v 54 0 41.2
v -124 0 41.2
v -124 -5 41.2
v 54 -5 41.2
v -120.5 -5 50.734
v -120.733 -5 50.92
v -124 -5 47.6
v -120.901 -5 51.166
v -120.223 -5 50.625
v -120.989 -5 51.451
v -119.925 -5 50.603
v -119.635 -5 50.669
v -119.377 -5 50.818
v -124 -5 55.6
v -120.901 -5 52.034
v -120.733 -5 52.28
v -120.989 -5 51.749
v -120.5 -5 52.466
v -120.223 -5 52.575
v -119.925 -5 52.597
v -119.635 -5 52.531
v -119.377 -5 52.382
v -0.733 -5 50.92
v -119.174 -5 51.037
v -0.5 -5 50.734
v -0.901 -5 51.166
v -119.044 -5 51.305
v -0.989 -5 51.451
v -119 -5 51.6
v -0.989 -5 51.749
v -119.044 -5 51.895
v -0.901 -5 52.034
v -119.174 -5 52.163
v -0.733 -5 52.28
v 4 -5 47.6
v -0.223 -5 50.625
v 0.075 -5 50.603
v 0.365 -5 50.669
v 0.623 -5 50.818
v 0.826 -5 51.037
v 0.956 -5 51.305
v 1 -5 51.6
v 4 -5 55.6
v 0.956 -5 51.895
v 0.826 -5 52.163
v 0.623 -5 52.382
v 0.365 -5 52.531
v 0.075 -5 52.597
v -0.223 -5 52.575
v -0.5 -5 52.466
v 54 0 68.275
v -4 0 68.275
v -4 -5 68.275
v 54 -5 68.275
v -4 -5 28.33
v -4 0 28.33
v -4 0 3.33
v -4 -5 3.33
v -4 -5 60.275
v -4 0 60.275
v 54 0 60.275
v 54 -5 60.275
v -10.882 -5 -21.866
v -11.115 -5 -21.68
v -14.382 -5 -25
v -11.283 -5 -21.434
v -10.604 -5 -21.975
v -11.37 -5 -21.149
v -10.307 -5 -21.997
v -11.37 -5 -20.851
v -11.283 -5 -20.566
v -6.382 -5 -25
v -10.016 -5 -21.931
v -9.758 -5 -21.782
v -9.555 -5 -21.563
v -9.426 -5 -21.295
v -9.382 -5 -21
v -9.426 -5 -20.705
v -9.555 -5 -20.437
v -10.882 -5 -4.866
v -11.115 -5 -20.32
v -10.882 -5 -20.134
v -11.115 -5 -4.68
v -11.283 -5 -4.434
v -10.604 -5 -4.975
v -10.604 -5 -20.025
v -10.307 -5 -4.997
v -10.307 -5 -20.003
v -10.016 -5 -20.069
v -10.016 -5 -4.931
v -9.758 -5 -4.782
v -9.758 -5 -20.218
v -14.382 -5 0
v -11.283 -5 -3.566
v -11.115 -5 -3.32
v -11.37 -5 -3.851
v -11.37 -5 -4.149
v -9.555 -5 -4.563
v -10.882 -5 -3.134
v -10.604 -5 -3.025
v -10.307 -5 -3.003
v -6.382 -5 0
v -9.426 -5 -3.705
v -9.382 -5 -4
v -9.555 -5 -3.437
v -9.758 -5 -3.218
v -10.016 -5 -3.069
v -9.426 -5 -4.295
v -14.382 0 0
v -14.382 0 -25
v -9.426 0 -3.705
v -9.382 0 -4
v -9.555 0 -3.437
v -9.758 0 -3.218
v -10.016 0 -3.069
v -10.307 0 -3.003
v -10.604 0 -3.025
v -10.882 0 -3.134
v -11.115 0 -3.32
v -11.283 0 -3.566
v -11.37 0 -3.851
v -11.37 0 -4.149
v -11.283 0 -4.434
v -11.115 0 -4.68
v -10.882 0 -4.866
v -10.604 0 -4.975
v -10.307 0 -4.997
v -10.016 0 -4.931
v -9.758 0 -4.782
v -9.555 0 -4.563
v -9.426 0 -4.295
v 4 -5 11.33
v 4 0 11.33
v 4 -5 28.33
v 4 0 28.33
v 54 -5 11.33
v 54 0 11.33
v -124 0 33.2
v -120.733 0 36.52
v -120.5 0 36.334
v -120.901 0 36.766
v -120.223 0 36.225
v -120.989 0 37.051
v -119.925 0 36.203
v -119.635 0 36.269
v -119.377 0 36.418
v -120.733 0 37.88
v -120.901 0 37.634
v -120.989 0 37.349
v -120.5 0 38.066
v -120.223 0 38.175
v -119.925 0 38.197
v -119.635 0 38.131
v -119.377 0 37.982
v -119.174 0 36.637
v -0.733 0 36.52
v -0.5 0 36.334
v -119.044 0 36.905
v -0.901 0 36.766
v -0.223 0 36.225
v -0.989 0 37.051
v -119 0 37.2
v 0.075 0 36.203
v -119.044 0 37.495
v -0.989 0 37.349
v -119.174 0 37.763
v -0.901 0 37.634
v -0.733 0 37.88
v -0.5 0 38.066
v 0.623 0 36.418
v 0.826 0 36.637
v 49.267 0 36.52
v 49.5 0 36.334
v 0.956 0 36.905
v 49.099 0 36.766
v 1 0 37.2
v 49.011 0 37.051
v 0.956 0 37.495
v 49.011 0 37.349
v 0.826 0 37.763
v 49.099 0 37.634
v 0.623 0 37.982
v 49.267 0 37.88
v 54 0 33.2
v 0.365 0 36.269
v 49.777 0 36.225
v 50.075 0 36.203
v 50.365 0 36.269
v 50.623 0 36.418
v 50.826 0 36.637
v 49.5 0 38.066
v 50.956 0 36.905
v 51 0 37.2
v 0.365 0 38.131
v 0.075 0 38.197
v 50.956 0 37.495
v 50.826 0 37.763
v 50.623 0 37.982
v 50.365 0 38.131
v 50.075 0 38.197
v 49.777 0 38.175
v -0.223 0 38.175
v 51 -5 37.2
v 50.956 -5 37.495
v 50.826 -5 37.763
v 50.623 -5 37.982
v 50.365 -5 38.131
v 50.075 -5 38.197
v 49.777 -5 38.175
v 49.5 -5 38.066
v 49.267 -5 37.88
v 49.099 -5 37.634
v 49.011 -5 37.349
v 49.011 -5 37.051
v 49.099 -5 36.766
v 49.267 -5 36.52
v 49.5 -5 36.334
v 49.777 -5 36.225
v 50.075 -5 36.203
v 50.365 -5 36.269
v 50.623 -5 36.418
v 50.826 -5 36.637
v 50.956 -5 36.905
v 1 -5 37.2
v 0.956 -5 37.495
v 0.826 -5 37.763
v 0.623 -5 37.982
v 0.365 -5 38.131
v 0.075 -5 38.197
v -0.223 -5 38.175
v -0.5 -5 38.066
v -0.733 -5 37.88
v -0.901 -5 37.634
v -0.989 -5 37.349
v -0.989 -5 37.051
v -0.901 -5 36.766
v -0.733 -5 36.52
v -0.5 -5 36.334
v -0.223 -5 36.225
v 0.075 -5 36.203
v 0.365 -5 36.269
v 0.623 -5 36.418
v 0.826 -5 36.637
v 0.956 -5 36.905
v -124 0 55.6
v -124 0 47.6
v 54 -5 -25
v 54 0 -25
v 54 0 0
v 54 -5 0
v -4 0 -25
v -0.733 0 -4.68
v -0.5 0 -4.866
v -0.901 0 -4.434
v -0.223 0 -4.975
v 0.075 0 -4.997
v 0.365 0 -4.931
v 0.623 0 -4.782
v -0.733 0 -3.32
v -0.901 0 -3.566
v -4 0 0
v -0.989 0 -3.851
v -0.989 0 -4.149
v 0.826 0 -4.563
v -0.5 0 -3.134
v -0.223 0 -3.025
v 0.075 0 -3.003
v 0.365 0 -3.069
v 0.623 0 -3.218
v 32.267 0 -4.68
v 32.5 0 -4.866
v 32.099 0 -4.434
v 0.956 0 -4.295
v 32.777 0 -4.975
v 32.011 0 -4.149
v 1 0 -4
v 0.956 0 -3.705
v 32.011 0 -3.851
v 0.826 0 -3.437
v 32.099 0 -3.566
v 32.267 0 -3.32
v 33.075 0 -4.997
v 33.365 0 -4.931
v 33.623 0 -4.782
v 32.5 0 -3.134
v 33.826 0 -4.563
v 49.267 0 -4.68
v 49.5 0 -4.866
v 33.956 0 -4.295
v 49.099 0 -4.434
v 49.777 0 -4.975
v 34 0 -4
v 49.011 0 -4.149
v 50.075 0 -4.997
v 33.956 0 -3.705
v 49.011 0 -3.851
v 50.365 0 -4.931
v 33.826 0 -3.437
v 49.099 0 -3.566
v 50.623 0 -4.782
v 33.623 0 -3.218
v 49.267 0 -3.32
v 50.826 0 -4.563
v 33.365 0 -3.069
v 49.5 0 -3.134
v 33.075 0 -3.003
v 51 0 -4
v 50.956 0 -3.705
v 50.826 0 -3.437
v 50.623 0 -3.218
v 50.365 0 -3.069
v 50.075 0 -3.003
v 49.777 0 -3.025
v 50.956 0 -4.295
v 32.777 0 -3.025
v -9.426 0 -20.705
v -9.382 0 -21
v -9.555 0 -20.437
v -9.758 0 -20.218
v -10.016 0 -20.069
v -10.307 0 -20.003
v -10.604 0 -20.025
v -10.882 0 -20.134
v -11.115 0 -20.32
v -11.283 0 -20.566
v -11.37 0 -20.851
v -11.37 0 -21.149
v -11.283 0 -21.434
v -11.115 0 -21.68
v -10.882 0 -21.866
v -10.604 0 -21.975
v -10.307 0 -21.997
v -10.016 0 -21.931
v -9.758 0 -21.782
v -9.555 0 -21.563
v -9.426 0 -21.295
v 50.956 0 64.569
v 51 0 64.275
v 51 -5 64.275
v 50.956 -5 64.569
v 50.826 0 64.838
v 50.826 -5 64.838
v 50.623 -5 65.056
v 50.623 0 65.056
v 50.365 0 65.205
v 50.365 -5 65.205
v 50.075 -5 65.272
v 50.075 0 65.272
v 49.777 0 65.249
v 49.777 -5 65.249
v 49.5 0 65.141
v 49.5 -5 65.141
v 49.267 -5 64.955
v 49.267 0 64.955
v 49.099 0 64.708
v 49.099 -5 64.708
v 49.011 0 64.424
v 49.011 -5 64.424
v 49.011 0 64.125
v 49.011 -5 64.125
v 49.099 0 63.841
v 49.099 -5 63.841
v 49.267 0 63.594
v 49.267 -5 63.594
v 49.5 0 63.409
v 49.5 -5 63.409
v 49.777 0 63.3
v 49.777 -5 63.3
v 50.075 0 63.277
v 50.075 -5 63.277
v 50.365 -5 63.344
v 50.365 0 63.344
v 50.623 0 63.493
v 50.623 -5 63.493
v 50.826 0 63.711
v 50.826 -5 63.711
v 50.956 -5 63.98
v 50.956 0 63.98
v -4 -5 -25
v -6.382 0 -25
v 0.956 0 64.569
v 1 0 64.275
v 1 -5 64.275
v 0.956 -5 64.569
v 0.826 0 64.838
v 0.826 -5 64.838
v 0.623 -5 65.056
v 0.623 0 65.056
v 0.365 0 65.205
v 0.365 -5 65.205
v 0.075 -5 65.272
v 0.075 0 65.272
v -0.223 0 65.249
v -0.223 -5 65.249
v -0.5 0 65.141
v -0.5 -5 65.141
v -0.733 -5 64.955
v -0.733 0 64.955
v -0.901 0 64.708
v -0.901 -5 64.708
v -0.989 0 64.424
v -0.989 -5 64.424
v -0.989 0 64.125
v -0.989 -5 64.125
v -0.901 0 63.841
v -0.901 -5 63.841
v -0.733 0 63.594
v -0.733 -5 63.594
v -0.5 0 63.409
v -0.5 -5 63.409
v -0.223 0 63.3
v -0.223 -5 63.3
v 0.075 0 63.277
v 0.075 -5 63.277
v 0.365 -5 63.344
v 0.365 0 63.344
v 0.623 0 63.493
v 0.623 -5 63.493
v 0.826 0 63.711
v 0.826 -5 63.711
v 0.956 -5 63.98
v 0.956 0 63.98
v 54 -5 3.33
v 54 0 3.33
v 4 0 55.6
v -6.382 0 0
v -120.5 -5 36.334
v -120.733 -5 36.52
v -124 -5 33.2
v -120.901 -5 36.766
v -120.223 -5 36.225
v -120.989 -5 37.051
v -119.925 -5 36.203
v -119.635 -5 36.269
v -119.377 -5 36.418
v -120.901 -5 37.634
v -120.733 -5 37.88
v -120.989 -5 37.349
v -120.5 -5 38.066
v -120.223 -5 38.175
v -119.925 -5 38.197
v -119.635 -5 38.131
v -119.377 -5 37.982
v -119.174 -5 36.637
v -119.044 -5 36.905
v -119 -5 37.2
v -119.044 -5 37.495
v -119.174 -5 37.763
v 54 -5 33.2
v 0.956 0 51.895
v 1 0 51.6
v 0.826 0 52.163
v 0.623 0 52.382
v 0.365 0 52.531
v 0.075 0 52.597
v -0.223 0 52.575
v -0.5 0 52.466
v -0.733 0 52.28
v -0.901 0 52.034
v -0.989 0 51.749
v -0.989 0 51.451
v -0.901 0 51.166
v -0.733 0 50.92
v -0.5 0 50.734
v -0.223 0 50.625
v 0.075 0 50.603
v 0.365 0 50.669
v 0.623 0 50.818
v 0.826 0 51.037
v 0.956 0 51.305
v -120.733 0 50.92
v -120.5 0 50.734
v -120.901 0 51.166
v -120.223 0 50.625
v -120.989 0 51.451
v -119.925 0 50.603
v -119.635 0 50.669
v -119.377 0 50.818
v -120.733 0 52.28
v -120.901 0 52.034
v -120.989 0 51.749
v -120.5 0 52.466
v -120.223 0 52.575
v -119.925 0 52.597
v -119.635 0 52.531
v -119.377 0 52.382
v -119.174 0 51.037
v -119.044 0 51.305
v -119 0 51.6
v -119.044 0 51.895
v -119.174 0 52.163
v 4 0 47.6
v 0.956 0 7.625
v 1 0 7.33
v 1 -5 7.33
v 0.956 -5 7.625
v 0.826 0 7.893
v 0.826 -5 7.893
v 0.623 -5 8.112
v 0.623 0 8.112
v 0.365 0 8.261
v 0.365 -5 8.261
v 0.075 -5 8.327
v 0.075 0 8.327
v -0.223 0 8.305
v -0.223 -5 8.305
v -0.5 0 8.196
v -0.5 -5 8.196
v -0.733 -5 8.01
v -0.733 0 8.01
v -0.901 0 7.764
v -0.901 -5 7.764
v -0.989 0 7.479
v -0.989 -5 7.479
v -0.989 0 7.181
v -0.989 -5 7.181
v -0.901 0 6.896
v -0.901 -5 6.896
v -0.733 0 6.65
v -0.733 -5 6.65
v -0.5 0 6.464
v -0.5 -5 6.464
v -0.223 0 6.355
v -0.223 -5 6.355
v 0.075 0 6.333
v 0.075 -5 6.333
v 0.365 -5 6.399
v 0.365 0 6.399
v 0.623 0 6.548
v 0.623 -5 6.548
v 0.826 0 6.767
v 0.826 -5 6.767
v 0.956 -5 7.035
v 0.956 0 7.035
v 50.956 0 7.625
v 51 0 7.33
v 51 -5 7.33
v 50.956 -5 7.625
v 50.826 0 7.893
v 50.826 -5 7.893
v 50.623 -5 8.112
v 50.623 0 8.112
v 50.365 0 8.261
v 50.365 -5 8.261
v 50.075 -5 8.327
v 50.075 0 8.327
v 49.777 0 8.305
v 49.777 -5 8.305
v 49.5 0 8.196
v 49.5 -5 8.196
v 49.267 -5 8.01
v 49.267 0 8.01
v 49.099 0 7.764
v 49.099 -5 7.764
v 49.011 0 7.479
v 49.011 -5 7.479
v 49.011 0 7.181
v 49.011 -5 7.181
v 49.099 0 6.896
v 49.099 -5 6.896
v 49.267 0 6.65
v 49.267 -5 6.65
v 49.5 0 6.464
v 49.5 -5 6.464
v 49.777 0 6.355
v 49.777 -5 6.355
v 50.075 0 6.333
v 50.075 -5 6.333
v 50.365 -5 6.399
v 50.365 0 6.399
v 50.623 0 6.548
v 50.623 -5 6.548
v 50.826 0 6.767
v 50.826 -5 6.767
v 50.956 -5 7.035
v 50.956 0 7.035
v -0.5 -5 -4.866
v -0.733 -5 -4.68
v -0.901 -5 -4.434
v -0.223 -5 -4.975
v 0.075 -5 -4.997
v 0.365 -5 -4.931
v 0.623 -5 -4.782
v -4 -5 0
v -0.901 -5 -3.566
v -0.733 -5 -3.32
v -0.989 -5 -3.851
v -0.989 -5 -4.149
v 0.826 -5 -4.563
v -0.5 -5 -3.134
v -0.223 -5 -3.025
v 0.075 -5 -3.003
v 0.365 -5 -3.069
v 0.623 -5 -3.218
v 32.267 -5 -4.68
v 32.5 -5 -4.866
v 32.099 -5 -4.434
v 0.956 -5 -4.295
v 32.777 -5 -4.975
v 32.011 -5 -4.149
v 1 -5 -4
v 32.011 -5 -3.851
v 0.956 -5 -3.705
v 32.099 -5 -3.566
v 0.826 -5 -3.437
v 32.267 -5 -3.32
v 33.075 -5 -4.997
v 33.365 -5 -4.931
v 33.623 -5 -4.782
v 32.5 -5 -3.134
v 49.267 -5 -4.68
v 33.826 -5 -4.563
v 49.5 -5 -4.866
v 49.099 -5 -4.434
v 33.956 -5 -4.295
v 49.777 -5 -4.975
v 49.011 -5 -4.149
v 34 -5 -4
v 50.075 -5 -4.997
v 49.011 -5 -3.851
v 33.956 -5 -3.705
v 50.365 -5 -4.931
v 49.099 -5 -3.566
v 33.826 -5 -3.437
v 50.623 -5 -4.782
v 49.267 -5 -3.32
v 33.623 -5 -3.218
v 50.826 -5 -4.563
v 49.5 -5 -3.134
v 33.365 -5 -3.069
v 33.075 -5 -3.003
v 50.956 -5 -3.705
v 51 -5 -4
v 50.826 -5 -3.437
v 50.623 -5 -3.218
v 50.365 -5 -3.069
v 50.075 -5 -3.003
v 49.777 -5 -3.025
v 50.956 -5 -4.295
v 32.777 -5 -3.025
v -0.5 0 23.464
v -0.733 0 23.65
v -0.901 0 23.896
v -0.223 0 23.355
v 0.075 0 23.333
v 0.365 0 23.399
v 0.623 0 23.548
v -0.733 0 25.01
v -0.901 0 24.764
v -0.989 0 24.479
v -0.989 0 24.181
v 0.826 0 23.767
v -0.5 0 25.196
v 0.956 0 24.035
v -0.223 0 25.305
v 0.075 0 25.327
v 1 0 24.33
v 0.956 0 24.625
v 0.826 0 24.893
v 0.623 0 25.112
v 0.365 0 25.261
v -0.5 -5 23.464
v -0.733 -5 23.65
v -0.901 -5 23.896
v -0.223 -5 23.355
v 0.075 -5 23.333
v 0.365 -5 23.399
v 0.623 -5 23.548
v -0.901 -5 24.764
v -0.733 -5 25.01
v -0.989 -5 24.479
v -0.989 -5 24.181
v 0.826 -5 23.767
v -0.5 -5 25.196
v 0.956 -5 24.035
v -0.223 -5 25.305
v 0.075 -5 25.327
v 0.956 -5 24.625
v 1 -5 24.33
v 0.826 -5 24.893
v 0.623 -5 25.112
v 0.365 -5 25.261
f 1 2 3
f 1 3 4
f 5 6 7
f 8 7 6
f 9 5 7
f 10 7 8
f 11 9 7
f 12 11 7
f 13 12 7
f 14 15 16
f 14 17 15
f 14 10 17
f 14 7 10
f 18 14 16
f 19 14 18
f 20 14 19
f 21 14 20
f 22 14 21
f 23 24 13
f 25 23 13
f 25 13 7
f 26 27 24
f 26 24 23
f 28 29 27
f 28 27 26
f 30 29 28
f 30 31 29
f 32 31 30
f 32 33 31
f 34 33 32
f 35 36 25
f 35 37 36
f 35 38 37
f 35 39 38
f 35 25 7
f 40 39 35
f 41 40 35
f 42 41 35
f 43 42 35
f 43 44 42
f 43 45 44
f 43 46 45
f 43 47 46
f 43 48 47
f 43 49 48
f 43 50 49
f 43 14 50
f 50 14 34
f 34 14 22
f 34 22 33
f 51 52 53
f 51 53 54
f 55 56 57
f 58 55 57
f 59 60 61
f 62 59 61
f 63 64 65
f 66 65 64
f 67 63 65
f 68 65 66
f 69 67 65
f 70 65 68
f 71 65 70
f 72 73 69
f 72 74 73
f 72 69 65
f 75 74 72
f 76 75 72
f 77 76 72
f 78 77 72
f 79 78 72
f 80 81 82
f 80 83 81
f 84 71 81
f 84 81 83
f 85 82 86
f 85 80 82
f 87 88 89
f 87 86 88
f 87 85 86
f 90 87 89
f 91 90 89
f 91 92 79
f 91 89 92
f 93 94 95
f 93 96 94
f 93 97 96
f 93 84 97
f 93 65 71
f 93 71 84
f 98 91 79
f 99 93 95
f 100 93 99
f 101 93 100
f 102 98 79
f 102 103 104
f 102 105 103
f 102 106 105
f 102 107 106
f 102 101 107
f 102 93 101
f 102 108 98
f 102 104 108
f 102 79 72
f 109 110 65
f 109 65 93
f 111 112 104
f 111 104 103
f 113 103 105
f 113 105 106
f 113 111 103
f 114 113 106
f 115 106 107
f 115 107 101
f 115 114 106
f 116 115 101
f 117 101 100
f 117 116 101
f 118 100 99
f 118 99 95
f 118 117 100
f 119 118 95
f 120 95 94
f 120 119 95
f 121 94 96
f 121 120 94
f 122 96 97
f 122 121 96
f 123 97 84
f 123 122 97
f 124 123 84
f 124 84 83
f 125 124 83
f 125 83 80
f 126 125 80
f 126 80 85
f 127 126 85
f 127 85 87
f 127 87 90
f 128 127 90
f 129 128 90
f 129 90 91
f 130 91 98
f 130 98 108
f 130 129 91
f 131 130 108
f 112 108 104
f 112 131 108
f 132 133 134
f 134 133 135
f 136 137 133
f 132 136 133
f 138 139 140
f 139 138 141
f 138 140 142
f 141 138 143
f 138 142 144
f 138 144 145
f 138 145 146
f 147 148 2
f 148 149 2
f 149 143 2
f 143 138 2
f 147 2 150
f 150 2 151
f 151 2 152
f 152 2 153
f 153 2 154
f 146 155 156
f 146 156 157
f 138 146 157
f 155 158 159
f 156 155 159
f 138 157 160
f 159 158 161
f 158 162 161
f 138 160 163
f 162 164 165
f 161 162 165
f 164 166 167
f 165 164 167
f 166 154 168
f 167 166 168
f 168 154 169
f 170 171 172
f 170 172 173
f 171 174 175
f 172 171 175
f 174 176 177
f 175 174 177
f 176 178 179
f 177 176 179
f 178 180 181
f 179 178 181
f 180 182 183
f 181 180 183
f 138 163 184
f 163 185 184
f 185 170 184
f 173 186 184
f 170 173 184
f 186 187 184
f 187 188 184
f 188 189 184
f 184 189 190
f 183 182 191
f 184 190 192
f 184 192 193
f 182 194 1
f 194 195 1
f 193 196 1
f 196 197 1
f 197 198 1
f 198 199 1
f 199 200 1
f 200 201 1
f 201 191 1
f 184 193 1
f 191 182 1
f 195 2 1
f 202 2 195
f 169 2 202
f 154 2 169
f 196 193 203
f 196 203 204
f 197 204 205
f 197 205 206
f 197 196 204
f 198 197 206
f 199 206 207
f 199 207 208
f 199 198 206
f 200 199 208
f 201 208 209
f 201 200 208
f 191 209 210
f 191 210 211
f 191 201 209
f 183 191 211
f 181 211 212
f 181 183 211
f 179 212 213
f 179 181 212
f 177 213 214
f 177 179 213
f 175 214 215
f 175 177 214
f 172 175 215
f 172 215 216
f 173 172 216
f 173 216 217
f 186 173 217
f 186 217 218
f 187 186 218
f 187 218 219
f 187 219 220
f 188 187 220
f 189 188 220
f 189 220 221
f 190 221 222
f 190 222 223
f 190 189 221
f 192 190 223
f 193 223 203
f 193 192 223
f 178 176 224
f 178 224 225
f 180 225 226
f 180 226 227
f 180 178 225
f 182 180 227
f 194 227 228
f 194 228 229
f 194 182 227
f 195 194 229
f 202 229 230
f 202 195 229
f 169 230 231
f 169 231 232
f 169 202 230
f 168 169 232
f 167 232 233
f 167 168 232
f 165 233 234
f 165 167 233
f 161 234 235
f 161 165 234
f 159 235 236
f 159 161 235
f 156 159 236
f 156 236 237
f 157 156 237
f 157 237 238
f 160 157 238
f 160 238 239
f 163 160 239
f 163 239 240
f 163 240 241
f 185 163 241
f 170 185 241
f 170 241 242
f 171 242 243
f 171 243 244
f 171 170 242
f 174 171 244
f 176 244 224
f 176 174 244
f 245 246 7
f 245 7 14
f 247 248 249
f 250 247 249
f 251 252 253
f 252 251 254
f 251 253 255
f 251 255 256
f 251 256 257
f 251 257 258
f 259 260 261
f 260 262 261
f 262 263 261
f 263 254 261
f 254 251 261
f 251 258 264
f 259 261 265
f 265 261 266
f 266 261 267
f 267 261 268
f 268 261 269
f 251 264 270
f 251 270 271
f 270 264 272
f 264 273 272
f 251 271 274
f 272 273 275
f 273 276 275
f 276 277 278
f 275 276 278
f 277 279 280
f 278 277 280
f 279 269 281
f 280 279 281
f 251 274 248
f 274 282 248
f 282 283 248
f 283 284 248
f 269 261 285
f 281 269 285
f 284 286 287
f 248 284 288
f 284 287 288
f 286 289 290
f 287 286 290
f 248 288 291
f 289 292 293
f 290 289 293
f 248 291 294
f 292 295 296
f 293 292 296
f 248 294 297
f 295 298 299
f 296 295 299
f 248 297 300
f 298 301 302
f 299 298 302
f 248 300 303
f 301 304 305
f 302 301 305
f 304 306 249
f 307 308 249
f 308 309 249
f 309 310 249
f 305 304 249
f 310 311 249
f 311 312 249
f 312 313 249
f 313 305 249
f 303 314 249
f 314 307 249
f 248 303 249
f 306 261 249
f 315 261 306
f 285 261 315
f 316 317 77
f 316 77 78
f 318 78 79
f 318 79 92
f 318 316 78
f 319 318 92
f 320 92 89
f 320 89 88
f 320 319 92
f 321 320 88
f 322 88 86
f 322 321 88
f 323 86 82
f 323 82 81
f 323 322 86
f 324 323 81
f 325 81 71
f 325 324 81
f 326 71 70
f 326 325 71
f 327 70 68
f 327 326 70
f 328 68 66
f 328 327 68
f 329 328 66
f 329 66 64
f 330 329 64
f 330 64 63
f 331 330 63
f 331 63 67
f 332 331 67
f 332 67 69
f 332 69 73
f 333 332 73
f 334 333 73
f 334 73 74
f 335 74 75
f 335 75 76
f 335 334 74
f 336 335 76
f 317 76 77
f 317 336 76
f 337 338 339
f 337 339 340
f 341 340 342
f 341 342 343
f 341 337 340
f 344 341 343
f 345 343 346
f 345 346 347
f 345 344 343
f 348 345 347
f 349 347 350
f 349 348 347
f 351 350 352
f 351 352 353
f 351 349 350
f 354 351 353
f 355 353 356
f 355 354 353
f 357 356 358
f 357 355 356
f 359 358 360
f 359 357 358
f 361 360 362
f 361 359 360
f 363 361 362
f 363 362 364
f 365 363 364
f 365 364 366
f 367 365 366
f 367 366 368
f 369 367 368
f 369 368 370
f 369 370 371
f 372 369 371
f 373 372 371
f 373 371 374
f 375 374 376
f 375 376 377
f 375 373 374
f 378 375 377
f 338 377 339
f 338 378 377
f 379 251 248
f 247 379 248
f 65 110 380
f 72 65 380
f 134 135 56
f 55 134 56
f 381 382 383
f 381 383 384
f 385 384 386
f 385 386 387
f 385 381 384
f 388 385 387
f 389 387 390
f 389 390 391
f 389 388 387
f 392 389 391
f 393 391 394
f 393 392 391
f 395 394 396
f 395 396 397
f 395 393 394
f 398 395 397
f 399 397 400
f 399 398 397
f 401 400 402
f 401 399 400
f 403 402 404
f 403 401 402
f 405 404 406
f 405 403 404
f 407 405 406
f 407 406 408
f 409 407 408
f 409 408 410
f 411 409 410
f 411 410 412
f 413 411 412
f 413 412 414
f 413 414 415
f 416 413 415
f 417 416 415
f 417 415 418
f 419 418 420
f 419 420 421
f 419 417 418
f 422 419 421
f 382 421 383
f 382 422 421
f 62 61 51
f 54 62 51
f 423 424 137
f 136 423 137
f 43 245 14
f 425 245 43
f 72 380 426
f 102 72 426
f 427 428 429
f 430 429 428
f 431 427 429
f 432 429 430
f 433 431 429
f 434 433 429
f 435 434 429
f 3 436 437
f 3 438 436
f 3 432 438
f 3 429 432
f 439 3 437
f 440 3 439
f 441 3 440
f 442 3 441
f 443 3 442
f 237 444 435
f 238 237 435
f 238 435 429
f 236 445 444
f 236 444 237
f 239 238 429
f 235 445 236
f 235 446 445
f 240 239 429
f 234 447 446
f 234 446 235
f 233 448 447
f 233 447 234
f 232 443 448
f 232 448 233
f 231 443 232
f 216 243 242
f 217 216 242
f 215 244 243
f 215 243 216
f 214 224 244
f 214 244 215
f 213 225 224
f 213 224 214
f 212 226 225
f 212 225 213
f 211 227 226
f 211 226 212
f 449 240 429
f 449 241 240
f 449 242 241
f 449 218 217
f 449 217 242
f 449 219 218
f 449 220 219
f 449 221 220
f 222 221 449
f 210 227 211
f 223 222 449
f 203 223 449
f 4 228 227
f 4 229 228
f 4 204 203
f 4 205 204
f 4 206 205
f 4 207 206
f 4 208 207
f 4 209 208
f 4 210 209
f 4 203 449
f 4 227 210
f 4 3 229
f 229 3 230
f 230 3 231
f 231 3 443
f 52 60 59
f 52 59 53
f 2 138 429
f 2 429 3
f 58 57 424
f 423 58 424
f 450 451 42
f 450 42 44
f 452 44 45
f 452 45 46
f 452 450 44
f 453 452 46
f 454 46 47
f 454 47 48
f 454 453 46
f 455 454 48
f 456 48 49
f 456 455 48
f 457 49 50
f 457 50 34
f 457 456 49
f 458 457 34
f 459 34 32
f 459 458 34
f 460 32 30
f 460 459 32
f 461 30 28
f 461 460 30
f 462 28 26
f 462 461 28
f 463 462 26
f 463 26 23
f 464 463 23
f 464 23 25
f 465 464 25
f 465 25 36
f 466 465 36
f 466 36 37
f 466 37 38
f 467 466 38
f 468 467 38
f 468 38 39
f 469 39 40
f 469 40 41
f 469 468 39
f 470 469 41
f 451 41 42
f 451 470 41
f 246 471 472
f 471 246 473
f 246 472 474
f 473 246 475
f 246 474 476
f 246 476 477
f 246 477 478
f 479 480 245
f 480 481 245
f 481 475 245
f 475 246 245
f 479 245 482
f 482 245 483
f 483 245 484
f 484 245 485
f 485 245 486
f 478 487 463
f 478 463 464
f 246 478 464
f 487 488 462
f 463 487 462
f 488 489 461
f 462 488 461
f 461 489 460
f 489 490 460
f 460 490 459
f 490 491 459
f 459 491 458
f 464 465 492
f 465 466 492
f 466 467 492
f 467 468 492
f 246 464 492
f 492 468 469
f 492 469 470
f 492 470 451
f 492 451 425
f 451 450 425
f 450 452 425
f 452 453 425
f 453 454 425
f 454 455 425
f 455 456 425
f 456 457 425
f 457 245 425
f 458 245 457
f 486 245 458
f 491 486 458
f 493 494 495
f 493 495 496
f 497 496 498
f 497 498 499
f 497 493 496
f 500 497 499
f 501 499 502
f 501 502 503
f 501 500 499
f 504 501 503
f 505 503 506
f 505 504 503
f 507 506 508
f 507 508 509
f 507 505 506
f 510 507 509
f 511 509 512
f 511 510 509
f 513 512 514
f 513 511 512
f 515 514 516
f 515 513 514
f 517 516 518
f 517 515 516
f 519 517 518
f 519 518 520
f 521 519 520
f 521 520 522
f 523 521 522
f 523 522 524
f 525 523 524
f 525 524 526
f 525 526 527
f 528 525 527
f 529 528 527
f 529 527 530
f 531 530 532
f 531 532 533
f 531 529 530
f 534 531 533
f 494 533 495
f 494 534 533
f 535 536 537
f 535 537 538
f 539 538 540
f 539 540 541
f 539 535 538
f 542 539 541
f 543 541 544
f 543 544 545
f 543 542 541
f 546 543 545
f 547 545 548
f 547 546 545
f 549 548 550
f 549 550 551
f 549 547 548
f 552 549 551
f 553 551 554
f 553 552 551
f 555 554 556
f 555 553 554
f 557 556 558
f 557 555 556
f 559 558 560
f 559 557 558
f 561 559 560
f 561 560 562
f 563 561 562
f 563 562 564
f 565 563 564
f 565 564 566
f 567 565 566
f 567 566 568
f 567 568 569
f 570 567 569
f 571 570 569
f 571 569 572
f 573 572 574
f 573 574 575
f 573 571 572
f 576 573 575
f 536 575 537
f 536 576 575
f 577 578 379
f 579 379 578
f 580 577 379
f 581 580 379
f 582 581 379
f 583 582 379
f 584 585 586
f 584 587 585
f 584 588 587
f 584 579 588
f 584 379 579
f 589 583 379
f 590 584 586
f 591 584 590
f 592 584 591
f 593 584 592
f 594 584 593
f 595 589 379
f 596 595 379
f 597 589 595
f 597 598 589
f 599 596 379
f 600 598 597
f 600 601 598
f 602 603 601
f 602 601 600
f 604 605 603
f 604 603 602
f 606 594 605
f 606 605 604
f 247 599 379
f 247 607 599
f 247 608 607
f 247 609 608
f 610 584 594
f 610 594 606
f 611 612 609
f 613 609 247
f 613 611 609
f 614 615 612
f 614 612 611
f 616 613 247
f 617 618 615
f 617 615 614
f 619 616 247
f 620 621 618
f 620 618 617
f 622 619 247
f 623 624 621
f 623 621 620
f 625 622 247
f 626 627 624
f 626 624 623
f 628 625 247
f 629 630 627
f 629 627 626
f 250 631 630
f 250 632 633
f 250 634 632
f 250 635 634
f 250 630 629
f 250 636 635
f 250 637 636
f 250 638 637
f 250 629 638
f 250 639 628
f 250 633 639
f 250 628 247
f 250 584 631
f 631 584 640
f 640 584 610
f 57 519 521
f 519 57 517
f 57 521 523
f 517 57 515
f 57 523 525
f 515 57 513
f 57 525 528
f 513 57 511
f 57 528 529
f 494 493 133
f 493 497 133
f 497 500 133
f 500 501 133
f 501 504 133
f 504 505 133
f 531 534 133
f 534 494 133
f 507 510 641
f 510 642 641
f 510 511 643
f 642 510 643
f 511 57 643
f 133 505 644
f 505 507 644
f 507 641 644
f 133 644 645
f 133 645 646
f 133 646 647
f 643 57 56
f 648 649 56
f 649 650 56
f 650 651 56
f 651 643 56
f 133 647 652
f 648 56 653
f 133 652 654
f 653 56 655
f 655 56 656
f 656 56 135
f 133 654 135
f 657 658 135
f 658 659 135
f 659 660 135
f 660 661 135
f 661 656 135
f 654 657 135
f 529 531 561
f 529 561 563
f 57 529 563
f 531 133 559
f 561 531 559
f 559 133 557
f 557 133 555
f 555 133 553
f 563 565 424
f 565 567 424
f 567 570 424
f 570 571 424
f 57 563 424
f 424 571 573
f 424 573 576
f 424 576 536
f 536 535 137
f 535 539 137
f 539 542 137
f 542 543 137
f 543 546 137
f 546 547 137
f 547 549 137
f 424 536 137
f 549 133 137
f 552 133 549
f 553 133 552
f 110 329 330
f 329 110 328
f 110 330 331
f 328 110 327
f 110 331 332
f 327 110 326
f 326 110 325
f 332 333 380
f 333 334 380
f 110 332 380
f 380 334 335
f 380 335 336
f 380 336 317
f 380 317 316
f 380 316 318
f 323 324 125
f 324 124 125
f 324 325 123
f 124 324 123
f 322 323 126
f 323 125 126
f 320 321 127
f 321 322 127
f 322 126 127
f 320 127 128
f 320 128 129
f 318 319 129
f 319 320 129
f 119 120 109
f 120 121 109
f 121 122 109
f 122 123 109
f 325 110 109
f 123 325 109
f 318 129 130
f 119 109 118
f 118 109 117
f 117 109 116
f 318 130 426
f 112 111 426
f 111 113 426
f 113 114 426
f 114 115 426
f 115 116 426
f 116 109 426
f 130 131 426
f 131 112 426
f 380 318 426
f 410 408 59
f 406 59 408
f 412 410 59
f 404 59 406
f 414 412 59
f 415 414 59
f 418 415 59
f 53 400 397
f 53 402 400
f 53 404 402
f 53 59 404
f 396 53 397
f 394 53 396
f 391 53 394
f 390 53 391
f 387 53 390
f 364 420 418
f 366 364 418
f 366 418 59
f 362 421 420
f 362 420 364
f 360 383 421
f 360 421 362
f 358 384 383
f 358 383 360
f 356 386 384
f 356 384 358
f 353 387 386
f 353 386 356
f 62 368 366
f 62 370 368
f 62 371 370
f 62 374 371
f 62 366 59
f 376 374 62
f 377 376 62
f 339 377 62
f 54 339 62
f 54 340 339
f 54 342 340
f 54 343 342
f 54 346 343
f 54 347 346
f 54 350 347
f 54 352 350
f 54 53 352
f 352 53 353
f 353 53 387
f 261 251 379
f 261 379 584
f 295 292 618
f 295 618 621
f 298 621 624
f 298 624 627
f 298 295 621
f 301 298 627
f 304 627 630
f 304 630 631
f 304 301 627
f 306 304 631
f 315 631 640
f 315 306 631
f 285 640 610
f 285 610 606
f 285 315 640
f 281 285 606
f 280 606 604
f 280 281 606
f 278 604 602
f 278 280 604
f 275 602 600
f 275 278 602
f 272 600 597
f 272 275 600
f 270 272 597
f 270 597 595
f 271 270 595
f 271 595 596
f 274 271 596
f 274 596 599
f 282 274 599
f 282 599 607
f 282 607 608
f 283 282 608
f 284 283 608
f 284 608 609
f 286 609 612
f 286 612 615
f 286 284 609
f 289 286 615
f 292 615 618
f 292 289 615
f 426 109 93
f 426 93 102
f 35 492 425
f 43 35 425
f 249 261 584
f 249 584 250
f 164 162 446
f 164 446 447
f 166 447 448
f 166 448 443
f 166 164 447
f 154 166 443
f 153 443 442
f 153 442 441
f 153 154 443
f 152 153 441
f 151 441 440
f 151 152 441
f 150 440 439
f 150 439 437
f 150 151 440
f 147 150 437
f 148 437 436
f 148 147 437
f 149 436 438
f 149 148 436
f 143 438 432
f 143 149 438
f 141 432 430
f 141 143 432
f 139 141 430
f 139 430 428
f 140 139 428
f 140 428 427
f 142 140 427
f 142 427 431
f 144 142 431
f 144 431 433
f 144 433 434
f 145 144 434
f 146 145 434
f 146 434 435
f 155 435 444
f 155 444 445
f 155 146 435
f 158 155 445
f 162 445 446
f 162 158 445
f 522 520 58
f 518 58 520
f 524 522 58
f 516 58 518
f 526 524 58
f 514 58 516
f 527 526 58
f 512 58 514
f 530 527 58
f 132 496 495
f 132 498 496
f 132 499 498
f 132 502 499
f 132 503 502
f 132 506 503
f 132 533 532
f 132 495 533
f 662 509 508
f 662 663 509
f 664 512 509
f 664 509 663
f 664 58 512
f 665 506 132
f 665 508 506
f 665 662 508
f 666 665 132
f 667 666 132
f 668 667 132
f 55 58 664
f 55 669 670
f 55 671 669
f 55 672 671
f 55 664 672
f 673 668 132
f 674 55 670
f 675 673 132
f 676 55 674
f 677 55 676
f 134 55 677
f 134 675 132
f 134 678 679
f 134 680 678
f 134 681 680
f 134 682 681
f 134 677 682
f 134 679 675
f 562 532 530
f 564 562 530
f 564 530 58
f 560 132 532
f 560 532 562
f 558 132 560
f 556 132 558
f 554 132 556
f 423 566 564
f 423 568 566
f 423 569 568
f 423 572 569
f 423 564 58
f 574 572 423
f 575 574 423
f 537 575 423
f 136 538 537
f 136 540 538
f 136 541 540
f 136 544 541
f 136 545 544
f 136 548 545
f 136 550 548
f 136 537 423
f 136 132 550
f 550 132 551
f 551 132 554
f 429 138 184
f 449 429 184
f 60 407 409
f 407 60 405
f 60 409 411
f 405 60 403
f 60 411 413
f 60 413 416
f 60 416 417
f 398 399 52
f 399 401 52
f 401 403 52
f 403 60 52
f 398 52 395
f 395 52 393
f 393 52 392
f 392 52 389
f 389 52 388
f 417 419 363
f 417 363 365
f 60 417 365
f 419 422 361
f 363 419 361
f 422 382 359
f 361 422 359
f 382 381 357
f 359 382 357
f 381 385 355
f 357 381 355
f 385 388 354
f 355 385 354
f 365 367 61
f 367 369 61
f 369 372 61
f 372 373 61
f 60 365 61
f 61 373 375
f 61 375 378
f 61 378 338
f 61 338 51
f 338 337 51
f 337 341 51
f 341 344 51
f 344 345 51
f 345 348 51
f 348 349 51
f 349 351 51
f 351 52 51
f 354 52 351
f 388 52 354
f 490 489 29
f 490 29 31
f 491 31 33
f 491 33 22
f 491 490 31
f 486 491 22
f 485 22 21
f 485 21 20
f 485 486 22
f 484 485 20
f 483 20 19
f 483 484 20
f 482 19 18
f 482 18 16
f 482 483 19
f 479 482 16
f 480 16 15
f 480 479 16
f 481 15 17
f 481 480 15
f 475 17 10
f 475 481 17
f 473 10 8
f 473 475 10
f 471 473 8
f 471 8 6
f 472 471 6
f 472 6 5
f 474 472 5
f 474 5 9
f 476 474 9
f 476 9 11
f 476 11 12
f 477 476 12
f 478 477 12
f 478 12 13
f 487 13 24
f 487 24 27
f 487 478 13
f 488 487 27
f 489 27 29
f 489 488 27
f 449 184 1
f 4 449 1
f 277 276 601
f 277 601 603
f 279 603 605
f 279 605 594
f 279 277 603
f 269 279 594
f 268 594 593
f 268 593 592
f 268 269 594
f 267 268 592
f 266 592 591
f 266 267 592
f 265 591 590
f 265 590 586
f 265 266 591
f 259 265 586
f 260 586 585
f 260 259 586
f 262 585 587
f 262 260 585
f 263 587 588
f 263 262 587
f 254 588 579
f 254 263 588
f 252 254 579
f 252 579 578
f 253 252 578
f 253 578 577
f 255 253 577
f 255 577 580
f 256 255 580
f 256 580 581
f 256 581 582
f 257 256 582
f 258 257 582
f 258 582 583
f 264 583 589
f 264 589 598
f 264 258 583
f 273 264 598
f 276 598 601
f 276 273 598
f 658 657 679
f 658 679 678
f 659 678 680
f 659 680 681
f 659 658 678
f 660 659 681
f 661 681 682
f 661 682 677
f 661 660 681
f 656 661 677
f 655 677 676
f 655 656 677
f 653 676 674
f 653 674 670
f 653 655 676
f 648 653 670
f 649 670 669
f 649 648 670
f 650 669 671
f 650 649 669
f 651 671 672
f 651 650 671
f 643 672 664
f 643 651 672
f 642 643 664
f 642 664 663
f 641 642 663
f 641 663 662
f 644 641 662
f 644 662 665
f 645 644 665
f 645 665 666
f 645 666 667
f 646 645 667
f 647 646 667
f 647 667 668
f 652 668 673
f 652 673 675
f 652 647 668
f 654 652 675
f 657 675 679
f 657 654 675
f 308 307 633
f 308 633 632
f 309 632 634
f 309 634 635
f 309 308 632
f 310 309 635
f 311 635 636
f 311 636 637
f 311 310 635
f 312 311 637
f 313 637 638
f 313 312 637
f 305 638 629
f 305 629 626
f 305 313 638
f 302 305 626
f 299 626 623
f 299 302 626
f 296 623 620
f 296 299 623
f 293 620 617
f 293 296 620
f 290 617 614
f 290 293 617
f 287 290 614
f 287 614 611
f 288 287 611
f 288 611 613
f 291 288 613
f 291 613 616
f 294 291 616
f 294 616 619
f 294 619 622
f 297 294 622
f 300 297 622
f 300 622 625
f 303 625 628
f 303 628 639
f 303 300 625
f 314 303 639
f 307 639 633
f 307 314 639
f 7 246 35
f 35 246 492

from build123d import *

# Parameters (mm, degrees)
F0_W     = 58
F0_H     = 8
F0_R     = 1
F1_DEPTH = 5
F0_W_2   = 128
F0_W_3   = 178
F0_W_4   = 8
F0_H_2   = 25


with BuildPart() as f1:
    # F0 (on Front) → F1 (new body)
    with BuildSketch(Plane.XZ):
        with Locations((25, 64.274541378)):
            Rectangle(F0_W, F0_H)
        with Locations((0, 64.274541378)):
            Circle(F0_R, mode=Mode.SUBTRACT)
        with Locations((50, 64.274541378)):
            Circle(F0_R, mode=Mode.SUBTRACT)
    extrude(amount=F1_DEPTH)


with BuildPart() as f1b:
    # F0 (on Front) → F1, piece 2 (new body)
    with BuildSketch(Plane.XZ):
        with Locations((-60, 51.6000244266)):
            Rectangle(F0_W_2, F0_H)
        with Locations((-120, 51.6000244266)):
            Circle(F0_R, mode=Mode.SUBTRACT)
        with Locations((0, 51.6000244266)):
            Circle(F0_R, mode=Mode.SUBTRACT)
    extrude(amount=F1_DEPTH)


with BuildPart() as f1c:
    # F0 (on Front) → F1, piece 3 (new body)
    with BuildSketch(Plane.XZ):
        with Locations((-35, 37.2000169107)):
            Rectangle(F0_W_3, F0_H)
        with Locations((-120, 37.2000169107)):
            Circle(F0_R, mode=Mode.SUBTRACT)
        with Locations((0, 37.2000169107)):
            Circle(F0_R, mode=Mode.SUBTRACT)
        with Locations((50, 37.2000169107)):
            Circle(F0_R, mode=Mode.SUBTRACT)
    extrude(amount=F1_DEPTH)


with BuildPart() as f1d:
    # F0 (on Front) → F1, piece 4 (new body)
    with BuildSketch(Plane.XZ):
        Polygon((4, 28.3301443327), (-4, 28.3301443327), (-4, 3.3301443327), (54, 3.3301443327), (54, 11.3301443327), (4, 11.3301443327), align=None)
        with Locations((0, 7.3301443327)):
            Circle(F0_R, mode=Mode.SUBTRACT)
        with Locations((50, 7.3301443327)):
            Circle(F0_R, mode=Mode.SUBTRACT)
        with Locations((0, 24.3301443327)):
            Circle(F0_R, mode=Mode.SUBTRACT)
    extrude(amount=F1_DEPTH)


with BuildPart() as f1e:
    # F0 (on Front) → F1, piece 5 (new body)
    with BuildSketch(Plane.XZ):
        with Locations((-10.3815753981, -12.5)):
            Rectangle(F0_W_4, F0_H_2)
        with Locations((-10.3815753981, -21)):
            Circle(F0_R, mode=Mode.SUBTRACT)
        with Locations((-10.3815753981, -4)):
            Circle(F0_R, mode=Mode.SUBTRACT)
    extrude(amount=F1_DEPTH)


with BuildPart() as f1f:
    # F0 (on Front) → F1, piece 6 (new body)
    with BuildSketch(Plane.XZ):
        with Locations((25, -12.5)):
            Rectangle(F0_W, F0_H_2)
        with Locations((0, -4)):
            Circle(F0_R, mode=Mode.SUBTRACT)
        with Locations((33, -4)):
            Circle(F0_R, mode=Mode.SUBTRACT)
        with Locations((50, -4)):
            Circle(F0_R, mode=Mode.SUBTRACT)
    extrude(amount=F1_DEPTH)


solid = Compound([f1.part, f1b.part, f1c.part, f1d.part, f1e.part, f1f.part])
